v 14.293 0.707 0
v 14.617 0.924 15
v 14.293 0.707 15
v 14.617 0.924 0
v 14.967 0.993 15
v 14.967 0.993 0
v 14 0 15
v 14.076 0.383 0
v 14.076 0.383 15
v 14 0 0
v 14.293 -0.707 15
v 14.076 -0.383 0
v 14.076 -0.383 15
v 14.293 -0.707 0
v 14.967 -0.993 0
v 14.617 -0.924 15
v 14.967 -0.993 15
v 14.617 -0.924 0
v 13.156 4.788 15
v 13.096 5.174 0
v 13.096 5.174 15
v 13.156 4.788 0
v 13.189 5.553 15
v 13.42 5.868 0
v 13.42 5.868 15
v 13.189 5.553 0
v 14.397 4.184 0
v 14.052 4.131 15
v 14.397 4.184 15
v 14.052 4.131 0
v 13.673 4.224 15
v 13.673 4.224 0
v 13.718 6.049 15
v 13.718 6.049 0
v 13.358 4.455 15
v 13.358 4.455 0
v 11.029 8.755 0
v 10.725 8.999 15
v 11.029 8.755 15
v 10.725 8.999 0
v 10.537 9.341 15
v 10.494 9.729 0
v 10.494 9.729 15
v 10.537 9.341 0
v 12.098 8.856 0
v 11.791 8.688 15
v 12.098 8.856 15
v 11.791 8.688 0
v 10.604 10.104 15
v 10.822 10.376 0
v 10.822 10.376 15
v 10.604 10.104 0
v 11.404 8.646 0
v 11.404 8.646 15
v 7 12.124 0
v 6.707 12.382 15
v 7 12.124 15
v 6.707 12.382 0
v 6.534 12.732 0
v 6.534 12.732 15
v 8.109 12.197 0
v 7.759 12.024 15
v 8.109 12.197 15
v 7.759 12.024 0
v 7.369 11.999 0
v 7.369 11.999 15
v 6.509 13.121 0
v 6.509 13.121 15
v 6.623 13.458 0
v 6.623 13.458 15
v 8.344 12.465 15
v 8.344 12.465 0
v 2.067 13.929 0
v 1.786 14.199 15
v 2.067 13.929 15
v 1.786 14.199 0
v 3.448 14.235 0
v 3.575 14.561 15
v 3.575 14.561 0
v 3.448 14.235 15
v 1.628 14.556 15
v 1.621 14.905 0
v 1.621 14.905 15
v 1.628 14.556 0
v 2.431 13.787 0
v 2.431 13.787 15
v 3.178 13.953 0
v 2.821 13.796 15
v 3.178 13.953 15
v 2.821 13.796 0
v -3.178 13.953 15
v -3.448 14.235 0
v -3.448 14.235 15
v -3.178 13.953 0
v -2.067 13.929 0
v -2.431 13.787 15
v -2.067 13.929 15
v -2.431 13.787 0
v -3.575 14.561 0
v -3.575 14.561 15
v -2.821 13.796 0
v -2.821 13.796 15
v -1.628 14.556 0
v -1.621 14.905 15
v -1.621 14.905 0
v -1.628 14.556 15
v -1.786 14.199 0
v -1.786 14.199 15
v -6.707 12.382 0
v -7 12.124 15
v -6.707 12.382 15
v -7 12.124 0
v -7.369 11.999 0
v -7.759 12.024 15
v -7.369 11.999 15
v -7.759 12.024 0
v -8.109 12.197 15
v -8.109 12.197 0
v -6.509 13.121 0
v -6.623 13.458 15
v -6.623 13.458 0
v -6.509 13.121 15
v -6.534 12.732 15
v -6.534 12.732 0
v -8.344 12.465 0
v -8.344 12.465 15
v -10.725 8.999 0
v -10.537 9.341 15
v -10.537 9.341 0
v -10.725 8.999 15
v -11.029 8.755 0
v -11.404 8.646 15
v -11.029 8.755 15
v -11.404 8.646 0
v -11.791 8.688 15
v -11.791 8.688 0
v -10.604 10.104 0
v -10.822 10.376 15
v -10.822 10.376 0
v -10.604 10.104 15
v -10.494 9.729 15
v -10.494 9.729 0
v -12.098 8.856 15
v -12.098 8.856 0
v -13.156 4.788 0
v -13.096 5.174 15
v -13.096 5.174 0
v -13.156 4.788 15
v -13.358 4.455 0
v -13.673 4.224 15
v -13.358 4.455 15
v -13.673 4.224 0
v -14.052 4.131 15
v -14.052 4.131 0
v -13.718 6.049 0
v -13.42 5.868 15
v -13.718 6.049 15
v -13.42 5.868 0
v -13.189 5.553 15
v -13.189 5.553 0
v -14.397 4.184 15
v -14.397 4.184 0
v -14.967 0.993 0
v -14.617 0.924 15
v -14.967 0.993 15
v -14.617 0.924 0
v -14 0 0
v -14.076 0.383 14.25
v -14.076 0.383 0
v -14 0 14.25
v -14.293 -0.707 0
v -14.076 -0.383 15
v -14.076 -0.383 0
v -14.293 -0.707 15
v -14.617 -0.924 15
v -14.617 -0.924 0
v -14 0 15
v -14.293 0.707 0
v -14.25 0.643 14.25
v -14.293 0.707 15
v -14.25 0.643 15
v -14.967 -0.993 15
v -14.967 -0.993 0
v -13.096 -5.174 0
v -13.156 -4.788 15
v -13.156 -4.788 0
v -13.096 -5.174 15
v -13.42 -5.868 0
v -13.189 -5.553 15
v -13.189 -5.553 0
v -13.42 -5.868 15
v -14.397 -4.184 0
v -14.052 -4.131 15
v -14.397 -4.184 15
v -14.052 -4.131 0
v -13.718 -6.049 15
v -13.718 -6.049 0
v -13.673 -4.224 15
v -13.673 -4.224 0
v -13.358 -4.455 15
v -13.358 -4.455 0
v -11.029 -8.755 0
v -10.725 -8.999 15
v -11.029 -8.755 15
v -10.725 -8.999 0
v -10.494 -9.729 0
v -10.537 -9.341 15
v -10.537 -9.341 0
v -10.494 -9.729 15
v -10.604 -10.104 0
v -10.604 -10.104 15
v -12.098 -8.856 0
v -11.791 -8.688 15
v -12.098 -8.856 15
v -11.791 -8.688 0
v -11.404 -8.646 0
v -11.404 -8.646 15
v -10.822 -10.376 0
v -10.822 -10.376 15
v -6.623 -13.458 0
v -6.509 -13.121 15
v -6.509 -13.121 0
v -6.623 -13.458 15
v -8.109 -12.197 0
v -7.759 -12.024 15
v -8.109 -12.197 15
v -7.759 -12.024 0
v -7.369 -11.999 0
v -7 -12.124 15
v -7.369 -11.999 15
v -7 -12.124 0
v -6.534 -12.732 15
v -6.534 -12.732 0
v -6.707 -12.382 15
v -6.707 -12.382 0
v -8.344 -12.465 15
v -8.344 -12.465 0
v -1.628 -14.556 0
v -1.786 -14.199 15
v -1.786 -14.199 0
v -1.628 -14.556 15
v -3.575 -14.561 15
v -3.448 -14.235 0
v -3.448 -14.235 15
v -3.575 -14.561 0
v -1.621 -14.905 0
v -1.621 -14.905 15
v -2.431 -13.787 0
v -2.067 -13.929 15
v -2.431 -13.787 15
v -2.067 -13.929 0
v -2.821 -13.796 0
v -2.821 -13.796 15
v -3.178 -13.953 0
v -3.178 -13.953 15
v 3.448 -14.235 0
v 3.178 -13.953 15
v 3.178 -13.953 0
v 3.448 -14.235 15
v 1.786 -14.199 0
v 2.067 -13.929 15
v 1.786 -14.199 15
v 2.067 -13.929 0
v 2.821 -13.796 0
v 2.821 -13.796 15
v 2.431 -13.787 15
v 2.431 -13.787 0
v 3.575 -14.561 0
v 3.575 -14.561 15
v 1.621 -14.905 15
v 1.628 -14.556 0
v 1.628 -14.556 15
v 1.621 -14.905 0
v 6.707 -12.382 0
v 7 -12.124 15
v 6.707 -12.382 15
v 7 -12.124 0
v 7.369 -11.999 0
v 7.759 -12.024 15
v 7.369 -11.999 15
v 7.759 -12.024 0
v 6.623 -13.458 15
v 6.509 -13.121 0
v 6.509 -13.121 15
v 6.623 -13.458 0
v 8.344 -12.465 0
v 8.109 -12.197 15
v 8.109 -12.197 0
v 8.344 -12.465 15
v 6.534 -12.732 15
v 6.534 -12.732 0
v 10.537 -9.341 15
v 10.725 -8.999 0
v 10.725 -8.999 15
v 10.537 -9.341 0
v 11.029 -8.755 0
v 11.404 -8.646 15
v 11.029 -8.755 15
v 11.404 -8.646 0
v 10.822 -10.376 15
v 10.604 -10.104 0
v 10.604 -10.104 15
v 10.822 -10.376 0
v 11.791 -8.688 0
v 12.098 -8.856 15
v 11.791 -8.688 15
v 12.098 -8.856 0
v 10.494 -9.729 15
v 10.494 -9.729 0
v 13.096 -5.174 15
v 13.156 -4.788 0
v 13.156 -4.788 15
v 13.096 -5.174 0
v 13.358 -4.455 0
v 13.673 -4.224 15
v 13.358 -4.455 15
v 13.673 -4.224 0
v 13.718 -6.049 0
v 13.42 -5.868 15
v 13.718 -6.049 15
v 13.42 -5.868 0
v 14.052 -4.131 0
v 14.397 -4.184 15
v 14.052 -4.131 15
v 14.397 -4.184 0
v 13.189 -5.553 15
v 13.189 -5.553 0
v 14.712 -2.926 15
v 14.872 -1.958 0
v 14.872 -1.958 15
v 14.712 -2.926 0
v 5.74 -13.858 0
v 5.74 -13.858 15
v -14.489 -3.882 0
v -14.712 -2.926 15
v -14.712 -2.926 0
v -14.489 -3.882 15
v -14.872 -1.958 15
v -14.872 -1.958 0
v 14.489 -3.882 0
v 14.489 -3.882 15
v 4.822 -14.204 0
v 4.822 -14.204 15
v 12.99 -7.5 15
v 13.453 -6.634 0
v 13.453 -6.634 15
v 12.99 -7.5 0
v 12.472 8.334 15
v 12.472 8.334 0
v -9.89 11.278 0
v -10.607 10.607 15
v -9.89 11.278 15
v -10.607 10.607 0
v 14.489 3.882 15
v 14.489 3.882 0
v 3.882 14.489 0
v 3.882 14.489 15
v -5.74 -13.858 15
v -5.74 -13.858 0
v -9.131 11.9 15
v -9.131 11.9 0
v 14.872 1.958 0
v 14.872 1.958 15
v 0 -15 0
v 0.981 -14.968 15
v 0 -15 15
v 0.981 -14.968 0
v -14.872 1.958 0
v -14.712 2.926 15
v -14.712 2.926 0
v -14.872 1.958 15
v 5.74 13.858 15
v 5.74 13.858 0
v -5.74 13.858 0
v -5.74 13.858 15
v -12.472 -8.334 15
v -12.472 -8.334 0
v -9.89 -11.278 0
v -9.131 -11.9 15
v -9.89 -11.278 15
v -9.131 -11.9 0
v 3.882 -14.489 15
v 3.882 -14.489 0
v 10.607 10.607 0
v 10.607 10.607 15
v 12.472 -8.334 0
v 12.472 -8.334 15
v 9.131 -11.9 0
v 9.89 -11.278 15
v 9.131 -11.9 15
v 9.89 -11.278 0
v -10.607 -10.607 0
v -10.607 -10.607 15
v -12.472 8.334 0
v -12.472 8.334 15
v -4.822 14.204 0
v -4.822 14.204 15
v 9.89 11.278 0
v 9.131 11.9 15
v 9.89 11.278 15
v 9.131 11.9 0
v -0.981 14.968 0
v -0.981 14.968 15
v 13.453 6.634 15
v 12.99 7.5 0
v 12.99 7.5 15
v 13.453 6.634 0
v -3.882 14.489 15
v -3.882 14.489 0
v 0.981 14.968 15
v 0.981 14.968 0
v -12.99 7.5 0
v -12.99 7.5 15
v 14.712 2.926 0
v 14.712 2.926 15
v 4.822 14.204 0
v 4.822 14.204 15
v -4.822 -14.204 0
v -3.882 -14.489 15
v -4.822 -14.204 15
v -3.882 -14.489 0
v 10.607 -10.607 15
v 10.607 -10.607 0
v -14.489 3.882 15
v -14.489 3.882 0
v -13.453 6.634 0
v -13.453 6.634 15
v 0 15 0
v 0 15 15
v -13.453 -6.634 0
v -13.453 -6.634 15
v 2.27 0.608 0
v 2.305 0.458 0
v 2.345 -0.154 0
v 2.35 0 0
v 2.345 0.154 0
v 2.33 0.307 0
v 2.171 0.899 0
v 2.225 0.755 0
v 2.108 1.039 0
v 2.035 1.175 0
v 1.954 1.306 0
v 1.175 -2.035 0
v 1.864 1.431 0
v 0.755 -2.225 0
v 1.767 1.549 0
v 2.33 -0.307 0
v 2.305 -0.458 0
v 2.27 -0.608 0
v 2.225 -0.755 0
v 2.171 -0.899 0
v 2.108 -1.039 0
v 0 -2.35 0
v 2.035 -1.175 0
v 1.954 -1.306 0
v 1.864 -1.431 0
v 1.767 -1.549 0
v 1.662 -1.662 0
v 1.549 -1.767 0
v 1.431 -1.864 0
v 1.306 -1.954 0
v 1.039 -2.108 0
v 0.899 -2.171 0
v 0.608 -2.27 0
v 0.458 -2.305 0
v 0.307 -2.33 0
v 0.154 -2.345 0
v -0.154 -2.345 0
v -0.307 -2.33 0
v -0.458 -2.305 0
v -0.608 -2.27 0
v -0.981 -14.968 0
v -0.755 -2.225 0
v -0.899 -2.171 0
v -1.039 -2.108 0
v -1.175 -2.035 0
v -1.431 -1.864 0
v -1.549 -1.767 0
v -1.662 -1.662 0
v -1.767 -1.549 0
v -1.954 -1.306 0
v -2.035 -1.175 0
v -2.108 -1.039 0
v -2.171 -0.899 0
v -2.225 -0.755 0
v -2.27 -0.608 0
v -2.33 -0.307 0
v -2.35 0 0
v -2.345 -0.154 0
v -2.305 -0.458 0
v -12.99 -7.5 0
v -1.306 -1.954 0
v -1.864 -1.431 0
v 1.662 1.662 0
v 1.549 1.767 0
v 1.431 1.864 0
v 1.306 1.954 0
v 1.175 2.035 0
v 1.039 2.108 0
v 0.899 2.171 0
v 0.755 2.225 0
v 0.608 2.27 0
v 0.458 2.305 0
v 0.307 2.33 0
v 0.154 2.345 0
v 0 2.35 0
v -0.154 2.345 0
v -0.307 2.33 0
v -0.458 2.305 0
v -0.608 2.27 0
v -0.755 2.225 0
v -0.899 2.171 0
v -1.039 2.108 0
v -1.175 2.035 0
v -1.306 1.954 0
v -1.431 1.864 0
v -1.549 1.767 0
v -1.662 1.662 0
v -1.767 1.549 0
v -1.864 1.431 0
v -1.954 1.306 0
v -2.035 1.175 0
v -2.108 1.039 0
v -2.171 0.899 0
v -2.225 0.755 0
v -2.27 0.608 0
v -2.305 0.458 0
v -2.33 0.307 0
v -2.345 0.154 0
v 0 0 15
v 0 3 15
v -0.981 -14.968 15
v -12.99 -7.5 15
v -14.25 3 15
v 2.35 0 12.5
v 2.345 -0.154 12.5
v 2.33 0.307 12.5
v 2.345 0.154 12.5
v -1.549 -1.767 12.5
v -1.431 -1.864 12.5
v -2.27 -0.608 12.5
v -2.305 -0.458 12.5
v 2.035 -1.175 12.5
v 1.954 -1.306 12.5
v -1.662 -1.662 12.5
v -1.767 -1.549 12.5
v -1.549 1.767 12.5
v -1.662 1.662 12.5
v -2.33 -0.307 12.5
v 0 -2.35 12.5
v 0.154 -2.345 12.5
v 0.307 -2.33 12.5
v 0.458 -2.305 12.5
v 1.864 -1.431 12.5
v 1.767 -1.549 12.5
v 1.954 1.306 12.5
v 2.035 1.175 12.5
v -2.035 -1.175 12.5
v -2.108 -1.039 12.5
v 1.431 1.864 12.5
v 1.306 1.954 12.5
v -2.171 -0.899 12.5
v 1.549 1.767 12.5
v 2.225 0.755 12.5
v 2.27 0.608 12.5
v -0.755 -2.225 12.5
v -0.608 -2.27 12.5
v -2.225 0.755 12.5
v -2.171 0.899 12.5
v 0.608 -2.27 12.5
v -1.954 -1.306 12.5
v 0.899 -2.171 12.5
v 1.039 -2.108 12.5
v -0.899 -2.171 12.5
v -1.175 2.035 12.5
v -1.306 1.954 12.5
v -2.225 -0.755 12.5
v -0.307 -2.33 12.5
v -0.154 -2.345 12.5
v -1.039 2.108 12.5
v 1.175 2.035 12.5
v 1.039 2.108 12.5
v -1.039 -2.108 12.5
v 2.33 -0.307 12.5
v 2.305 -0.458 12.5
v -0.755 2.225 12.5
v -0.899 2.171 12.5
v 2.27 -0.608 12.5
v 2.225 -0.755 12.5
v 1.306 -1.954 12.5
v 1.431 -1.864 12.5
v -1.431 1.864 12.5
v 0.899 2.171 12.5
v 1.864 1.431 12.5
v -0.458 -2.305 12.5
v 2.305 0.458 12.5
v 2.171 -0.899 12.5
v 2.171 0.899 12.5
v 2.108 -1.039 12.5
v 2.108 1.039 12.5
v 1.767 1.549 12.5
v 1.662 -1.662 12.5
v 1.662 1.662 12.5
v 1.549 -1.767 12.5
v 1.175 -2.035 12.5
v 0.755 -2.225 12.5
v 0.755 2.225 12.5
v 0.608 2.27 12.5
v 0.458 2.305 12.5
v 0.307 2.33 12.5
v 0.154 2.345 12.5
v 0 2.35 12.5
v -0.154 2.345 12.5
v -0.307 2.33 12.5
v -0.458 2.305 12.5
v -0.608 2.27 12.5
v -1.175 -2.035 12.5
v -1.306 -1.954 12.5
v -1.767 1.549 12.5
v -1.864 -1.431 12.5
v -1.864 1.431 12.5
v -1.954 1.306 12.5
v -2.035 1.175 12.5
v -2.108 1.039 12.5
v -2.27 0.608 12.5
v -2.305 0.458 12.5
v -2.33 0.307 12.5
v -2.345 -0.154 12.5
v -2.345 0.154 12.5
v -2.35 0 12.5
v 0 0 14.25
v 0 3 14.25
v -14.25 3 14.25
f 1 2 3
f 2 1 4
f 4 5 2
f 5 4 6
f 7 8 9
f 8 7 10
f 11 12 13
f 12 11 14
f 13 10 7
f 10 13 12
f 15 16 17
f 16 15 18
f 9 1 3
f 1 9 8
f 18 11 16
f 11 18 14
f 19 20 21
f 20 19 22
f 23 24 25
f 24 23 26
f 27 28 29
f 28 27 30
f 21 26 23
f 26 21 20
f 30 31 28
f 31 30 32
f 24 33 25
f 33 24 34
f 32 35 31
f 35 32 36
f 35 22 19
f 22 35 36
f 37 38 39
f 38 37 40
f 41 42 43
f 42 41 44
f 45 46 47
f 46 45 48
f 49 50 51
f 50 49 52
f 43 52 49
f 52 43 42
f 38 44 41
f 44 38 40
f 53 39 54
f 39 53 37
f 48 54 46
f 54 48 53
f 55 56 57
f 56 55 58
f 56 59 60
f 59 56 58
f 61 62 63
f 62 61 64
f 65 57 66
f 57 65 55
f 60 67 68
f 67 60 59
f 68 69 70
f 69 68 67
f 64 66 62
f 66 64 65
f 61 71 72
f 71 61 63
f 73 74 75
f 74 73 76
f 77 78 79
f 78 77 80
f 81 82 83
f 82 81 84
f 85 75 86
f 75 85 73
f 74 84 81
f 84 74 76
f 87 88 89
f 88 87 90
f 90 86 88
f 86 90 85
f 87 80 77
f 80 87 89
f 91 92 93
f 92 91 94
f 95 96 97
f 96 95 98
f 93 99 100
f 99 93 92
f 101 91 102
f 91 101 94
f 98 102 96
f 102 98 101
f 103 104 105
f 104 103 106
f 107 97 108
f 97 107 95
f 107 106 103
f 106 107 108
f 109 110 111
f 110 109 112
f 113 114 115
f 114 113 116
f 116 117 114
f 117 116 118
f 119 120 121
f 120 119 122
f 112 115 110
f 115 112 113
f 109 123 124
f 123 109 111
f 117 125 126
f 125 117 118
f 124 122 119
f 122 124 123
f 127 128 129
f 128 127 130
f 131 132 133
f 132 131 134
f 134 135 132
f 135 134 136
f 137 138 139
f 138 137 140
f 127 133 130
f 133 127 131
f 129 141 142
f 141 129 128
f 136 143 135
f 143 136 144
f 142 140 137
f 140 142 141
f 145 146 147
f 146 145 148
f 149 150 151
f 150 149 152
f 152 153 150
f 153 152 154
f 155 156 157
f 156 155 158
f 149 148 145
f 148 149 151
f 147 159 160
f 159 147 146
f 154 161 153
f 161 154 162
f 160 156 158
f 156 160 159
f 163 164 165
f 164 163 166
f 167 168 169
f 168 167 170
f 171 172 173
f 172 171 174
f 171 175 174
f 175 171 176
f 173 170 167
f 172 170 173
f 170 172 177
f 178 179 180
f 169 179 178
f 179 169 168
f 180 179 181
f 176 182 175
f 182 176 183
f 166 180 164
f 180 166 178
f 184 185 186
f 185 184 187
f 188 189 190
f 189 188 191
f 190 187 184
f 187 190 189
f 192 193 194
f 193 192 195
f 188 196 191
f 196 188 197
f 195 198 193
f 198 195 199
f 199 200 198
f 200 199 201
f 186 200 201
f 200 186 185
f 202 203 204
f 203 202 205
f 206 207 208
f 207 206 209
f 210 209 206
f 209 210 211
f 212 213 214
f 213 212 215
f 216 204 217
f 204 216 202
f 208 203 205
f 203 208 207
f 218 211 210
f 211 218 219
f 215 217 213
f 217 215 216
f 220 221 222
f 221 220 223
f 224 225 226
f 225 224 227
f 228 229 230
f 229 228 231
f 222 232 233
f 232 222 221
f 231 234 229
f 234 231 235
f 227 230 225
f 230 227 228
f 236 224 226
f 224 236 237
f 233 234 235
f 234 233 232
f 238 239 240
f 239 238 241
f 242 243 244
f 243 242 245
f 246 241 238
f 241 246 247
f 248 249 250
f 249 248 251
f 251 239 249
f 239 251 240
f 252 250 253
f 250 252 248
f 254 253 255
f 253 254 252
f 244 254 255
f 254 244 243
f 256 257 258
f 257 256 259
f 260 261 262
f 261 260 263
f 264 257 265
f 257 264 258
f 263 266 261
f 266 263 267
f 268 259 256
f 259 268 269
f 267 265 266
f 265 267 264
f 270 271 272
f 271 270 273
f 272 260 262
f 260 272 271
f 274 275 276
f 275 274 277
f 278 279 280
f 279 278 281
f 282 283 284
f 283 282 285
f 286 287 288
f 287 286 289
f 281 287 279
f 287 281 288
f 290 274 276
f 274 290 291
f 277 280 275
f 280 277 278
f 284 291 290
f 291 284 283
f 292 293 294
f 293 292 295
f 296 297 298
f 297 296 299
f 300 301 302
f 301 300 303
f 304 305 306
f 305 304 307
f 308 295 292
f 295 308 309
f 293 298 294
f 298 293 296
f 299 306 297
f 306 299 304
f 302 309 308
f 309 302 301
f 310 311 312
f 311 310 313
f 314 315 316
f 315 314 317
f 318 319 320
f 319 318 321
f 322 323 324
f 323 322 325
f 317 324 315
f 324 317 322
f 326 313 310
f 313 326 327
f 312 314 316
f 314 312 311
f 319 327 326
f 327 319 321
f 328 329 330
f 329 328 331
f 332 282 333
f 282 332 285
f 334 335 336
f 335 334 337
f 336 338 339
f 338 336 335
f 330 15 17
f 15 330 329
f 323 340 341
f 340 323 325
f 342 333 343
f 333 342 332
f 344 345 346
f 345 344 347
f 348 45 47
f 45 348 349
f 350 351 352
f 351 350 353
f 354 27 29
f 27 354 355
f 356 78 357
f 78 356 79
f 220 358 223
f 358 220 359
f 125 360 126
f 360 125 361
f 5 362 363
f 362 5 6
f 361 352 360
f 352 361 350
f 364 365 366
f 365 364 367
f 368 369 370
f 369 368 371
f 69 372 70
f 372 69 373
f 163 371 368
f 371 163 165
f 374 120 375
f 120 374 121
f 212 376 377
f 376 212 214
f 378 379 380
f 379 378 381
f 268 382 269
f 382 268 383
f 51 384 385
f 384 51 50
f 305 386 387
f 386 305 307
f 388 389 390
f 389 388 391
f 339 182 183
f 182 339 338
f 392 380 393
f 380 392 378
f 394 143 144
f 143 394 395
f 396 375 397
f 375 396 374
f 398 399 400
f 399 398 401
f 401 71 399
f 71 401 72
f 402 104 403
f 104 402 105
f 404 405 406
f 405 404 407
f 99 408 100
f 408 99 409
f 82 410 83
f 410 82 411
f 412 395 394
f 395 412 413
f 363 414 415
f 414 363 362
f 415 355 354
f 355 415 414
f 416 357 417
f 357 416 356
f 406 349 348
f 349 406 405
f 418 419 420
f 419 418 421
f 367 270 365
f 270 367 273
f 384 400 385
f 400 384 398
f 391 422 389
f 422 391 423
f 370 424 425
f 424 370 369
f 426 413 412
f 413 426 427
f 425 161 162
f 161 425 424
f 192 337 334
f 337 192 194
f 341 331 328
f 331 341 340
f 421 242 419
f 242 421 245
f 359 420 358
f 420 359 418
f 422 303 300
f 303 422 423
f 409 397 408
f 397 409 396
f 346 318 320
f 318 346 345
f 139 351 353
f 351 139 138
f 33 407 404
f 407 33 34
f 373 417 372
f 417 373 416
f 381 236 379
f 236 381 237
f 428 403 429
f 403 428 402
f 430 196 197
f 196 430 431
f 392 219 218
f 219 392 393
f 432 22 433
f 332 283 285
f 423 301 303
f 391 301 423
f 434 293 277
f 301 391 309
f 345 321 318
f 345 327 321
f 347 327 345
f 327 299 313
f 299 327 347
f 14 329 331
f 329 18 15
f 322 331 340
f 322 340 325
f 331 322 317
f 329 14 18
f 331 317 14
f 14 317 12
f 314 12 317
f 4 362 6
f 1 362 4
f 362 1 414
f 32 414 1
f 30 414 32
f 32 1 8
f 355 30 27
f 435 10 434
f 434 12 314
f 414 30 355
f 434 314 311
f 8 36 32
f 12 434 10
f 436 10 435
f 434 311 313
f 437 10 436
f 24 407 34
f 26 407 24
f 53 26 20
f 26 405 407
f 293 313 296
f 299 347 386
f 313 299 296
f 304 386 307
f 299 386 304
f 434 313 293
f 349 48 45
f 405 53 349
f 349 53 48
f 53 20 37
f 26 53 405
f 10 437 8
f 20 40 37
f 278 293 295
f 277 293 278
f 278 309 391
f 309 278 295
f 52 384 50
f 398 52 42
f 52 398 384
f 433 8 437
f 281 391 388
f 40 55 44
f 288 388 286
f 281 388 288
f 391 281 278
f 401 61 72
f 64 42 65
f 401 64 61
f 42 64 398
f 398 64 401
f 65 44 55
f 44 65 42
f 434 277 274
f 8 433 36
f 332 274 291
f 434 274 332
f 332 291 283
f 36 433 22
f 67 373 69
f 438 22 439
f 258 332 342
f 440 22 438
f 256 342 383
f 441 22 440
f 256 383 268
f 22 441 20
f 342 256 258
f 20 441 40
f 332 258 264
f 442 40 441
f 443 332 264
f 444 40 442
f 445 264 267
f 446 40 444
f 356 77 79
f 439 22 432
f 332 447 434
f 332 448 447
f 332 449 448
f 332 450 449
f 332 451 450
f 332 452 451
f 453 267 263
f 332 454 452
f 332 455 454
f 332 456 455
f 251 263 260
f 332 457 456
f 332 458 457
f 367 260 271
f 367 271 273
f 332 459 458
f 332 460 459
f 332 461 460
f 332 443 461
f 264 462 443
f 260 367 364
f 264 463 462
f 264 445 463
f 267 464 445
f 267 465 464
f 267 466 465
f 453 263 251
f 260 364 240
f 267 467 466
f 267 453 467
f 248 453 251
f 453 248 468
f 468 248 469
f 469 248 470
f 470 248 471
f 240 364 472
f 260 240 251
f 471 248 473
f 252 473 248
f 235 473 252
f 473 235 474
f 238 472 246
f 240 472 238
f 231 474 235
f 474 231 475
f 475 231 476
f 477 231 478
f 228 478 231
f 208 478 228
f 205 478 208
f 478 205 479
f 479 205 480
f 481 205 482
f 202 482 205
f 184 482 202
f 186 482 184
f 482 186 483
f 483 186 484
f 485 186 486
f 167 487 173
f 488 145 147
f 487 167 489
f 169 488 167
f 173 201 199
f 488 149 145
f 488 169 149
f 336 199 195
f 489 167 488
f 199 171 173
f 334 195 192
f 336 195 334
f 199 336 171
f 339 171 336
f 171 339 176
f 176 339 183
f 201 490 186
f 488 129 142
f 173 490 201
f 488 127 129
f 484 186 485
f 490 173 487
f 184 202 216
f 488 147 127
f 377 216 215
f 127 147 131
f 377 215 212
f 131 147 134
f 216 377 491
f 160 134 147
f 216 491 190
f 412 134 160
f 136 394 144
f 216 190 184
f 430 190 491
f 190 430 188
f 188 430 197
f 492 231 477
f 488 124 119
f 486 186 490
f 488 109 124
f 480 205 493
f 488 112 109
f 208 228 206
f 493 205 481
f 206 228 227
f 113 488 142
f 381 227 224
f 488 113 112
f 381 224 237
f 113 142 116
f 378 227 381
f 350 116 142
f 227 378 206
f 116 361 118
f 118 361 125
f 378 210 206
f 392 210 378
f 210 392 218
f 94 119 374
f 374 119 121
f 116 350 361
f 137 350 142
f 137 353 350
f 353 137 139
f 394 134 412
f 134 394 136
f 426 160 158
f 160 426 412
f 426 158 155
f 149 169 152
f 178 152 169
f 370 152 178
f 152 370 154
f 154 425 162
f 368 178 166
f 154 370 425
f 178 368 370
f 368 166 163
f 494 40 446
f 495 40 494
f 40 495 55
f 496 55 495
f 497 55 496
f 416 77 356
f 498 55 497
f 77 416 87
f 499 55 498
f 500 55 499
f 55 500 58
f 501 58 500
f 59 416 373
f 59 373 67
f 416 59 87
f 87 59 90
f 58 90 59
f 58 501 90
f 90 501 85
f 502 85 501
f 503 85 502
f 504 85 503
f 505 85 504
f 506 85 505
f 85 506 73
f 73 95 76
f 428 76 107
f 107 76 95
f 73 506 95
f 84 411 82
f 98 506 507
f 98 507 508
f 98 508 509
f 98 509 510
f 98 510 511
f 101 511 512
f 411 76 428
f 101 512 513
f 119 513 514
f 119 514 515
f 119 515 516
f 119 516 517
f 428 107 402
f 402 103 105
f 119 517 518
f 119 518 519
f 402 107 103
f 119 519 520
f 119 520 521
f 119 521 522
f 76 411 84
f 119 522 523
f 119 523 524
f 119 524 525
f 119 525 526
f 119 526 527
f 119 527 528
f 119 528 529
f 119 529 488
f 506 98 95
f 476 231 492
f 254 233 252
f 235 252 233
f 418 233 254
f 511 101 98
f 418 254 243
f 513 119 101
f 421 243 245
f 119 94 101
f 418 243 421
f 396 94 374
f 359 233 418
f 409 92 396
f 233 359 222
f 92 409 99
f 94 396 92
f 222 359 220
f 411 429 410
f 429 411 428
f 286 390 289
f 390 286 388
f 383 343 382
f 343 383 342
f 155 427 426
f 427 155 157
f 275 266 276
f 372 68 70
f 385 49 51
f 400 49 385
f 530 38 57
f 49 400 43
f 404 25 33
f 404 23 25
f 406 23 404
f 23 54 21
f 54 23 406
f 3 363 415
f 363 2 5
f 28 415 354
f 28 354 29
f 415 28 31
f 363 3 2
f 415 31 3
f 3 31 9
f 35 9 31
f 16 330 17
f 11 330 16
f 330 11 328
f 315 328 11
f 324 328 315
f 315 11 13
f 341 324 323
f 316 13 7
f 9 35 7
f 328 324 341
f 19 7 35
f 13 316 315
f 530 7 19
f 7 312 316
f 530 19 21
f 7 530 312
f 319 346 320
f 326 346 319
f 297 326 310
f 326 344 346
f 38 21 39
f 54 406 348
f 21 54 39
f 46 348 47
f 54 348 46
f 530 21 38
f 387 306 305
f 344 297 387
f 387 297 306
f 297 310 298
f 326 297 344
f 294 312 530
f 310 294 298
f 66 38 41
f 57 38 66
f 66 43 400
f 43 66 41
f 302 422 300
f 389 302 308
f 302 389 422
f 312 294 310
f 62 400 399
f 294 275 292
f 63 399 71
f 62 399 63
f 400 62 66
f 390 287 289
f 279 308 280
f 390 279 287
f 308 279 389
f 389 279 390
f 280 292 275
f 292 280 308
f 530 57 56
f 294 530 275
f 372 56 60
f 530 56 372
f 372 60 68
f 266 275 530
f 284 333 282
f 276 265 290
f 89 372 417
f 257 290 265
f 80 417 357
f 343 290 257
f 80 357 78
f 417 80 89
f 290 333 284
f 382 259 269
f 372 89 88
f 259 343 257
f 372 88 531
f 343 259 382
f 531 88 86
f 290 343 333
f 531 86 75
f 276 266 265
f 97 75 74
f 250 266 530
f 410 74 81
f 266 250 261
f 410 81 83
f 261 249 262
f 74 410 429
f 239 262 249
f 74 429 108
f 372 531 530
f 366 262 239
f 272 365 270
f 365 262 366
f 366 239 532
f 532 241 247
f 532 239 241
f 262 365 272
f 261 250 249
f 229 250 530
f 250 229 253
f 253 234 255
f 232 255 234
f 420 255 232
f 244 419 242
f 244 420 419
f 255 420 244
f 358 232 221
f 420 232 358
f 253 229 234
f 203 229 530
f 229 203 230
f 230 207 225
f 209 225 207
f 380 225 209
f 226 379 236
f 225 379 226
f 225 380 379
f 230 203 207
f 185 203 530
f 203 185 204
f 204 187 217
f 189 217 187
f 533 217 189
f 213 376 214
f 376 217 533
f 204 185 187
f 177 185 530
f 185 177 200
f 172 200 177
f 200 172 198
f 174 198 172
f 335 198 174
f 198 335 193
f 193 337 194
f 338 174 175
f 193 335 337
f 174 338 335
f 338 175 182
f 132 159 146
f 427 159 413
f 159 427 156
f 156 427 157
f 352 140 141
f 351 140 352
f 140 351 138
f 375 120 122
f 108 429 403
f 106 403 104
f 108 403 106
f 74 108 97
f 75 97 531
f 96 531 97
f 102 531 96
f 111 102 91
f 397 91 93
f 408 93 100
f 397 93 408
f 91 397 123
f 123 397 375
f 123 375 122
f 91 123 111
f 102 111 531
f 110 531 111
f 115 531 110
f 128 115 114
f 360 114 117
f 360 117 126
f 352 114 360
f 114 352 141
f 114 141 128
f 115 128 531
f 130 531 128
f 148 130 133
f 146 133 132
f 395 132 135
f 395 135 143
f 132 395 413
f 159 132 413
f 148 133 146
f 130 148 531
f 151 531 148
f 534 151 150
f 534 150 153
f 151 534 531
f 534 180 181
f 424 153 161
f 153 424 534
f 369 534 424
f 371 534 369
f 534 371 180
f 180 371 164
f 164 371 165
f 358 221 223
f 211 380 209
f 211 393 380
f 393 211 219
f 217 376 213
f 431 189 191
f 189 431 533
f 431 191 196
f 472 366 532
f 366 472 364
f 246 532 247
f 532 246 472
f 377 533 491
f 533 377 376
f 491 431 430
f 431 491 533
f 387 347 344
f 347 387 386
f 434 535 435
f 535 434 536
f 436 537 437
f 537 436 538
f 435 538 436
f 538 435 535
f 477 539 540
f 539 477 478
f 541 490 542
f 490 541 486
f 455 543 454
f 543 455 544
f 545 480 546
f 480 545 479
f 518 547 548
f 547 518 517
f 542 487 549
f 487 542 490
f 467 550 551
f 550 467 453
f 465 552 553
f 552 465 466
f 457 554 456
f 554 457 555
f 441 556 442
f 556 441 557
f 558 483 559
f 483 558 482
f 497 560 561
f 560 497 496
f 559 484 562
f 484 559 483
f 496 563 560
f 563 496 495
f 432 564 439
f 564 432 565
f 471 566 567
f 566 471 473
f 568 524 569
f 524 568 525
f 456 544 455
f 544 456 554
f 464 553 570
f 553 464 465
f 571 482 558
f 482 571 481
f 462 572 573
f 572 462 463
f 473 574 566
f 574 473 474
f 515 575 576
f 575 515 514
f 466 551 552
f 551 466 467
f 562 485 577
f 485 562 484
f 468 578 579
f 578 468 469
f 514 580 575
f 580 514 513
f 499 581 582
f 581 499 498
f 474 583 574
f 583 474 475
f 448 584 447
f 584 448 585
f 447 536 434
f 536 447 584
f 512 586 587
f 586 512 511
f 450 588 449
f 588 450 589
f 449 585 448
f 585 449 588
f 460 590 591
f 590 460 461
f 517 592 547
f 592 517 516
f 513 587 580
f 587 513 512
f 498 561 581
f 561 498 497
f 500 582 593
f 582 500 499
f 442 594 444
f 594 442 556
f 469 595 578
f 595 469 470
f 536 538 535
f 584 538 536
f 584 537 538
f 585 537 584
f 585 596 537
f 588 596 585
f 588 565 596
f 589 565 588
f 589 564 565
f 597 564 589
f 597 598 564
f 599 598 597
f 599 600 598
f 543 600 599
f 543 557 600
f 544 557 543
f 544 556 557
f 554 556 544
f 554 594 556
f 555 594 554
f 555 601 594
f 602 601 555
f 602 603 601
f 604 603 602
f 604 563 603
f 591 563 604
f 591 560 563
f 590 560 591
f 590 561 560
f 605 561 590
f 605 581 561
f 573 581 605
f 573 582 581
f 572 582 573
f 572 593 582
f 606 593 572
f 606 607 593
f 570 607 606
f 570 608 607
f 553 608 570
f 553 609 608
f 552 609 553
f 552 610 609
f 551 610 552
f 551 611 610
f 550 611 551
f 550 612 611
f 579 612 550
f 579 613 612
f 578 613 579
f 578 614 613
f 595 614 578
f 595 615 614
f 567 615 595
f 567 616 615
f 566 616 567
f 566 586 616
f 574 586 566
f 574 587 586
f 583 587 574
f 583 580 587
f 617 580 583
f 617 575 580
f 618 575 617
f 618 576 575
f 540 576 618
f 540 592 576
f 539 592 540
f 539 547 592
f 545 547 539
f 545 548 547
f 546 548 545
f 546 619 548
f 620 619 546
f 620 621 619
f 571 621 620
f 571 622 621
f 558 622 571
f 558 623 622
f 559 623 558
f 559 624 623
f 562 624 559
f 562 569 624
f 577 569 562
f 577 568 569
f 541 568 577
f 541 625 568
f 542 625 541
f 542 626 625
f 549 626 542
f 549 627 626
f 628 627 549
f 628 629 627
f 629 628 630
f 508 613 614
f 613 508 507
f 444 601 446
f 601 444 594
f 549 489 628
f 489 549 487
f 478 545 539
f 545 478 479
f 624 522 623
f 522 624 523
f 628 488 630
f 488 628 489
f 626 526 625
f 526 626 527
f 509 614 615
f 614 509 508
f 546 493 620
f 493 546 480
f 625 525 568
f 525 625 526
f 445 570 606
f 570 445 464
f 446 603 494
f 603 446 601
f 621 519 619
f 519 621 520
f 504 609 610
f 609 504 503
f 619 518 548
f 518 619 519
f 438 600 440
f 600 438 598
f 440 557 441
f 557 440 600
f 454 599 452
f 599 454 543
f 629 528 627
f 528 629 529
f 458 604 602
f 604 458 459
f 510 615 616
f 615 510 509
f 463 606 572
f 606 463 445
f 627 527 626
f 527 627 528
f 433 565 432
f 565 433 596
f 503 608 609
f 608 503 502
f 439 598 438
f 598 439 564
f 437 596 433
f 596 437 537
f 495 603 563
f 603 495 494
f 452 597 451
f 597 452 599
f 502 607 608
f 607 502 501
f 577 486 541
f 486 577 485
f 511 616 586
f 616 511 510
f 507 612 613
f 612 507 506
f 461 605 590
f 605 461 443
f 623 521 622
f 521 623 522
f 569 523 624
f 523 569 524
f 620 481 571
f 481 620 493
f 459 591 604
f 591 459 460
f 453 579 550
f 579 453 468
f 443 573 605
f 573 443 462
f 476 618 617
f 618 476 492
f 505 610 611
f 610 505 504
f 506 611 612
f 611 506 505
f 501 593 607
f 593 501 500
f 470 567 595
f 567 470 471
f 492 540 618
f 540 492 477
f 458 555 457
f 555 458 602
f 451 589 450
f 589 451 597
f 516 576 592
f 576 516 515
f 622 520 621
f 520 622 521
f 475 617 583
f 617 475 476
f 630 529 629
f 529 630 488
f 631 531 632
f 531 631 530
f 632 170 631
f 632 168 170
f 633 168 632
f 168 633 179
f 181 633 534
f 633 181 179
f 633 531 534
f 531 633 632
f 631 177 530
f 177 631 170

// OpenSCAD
// Replacement knob for a hotplate stirrer with a 6 mm D-shaft
// Print orientation: bottom face (with D-bore) on the bed at z = 0

// ---------------- Parameters ----------------
knob_d        = 30;    // knob outer diameter
knob_h        = 15;    // knob height
shaft_d       = 6;     // D-shaft diameter (for reference)

bore_depth    = 12;    // D-bore depth from bottom face
bore_w        = 4.7;   // D-bore width (flat to opposite side of circle)
bore_c        = (bore_w - shaft_d) / 2;  // bore centre offset from shaft centre

groove_count  = 18;    // number of vertical grip grooves
groove_d      = 2;     // groove diameter (half-cylinder)
groove_h      = knob_h; // groove full height

pointer_w     = 1.5;   // pointer groove width
pointer_d     = pointer_w / 2; // pointer groove depth (1 mm)

eps           = 0.5;   // overcut so cutting faces are not coplanar
$fn           = 96;    // curve resolution

// ---------------- Model ----------------
difference() {
    // Main body
    cylinder(d = knob_d, h = knob_h);

    // D-shaped blind bore from bottom face
    translate([0, 0, -eps])
        cylinder(r = bore_w / 2, h = bore_depth + 2 * eps, center = [0, 0, bore_depth + eps]);

    // Vertical grip grooves around the outside
    for (i = [0 : groove_count - 1])
        rotate([0, 0, i * 360 / groove_count])
            translate([knob_d / 2, 0, -eps])
                cylinder(d = groove_d, h = groove_h + 2 * eps, $fn = 16);

    // Pointer groove on top face, on the same side as the flat of the D
    translate([-(knob_d / 2 - pointer_d), 0, knob_h - pointer_d])
        cube([knob_d / 2 - pointer_d, pointer_w * 2, pointer_d]);
}
